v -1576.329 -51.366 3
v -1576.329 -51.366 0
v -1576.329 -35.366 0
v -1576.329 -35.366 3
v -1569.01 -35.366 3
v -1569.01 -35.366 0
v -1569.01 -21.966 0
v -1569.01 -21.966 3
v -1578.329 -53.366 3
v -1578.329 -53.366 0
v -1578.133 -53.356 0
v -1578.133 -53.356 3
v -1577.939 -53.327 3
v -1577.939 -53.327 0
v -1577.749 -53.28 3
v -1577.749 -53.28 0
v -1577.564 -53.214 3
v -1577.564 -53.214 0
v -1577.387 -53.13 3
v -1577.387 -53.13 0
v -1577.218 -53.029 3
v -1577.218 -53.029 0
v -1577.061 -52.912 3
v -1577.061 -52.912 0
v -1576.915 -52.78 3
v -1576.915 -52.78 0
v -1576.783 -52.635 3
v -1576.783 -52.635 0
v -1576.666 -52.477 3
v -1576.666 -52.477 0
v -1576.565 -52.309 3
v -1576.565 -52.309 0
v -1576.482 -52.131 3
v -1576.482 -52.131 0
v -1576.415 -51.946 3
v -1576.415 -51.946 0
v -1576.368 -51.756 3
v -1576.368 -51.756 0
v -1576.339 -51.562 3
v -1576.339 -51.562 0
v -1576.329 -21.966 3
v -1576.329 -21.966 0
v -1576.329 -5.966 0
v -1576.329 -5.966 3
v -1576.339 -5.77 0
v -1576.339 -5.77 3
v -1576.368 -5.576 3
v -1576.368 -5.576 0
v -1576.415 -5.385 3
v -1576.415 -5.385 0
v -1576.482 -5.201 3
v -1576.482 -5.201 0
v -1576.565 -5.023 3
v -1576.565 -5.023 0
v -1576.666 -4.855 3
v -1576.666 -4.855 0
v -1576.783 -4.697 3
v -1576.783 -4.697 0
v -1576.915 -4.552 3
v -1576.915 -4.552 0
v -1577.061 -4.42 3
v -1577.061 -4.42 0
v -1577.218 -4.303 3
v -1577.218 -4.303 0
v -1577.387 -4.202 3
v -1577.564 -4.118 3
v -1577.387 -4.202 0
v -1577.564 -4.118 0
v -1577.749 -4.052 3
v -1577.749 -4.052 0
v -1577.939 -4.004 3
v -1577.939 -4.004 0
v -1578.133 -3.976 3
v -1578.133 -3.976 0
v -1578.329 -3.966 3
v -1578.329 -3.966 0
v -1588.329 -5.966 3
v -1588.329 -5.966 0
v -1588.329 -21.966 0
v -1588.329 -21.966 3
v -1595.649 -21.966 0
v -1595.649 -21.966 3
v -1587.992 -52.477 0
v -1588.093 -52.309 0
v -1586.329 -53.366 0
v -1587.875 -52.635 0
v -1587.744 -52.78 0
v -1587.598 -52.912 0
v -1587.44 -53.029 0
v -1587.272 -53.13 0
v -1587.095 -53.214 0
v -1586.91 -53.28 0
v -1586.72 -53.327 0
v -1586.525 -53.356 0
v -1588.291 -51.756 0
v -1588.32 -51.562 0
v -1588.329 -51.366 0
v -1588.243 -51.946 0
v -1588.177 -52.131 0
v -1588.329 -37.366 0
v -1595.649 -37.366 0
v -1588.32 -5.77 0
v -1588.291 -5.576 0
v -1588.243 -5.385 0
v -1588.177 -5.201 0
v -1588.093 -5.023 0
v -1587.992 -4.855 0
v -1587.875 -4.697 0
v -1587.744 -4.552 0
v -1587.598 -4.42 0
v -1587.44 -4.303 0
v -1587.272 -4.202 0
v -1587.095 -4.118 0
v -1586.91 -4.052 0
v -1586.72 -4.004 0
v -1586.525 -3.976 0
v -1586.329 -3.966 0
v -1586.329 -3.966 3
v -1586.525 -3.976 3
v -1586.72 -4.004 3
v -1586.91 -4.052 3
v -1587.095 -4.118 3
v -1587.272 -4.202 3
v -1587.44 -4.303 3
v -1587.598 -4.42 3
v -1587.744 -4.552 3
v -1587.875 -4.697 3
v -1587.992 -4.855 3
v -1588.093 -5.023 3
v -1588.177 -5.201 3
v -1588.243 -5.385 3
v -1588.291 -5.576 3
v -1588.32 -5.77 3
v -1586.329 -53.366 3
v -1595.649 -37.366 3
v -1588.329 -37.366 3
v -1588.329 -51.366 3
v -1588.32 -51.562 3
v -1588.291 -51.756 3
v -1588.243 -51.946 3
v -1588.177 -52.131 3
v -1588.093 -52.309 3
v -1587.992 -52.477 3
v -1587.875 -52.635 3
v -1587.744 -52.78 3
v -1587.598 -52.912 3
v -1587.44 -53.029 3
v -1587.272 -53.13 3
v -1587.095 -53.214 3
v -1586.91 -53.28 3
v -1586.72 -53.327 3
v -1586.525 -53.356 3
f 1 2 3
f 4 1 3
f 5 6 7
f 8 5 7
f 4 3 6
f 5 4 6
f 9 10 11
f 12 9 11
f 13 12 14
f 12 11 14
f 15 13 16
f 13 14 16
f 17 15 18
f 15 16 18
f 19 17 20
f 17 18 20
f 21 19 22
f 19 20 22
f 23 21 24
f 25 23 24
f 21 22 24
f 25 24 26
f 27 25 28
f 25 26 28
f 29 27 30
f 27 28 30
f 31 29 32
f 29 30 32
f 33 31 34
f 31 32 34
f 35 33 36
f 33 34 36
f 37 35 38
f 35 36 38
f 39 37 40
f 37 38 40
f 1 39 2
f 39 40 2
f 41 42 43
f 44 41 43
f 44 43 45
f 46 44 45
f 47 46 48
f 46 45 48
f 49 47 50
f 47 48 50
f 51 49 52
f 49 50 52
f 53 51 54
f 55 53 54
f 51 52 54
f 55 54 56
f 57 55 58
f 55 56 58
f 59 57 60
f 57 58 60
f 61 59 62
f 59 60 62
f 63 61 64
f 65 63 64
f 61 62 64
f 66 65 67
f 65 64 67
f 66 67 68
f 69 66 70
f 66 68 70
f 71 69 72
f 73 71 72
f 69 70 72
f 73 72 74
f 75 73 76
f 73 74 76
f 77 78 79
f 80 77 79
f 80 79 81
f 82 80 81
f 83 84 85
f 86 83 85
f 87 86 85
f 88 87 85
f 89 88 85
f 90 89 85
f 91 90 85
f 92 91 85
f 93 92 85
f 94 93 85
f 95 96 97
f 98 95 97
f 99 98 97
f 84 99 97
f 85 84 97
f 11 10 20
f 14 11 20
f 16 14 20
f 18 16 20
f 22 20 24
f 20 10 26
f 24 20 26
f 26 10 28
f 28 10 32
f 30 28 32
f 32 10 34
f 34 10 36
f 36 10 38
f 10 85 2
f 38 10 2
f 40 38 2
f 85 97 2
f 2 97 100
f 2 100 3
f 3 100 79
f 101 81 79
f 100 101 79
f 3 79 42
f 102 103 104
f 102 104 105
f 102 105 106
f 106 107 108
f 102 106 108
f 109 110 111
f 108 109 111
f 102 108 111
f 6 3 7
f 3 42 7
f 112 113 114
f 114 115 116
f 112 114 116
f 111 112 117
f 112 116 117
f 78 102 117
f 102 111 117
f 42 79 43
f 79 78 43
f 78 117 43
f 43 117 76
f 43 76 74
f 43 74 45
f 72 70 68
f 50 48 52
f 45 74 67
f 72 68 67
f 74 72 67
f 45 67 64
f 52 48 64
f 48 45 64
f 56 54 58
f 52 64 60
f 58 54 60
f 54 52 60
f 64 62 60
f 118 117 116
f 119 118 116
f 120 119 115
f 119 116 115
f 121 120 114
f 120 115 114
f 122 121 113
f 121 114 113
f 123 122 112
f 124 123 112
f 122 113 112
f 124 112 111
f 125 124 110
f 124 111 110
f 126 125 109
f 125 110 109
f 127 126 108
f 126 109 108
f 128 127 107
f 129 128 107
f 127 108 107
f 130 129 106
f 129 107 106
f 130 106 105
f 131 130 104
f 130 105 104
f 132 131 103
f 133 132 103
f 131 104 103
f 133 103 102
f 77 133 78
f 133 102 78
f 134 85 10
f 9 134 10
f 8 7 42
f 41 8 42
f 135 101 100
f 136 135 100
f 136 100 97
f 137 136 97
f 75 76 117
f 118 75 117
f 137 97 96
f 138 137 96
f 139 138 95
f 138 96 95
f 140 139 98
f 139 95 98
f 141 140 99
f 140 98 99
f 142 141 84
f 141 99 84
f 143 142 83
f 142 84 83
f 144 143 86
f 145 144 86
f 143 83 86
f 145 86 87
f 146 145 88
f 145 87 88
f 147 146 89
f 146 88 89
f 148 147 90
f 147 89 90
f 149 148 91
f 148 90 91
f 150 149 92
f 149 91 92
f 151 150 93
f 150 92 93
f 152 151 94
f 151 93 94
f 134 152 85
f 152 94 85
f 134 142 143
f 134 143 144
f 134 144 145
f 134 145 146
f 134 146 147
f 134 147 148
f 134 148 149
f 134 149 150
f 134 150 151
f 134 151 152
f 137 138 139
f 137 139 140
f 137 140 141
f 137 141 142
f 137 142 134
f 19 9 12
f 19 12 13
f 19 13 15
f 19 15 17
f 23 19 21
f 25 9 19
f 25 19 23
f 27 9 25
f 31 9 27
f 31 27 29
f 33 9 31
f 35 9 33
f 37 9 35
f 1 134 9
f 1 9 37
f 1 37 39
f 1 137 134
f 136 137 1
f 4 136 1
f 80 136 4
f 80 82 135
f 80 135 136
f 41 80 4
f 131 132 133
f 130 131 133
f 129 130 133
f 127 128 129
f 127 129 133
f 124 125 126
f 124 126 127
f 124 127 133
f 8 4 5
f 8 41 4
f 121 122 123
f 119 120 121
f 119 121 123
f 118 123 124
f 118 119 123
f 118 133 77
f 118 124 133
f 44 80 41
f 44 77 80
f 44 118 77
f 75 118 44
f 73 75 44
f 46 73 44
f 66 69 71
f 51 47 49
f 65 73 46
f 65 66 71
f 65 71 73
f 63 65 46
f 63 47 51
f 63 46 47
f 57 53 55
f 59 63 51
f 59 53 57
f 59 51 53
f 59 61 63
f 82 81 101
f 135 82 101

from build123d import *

# Parameters (mm, degrees)
BASE_EXTRUDE_DEPTH = 3


with BuildPart() as part:
    # Sketch1 → Base-Extrude (new body)
    with BuildSketch(Plane.XY):
        with BuildLine():
            Line((-1588.329332145, -37.365903922), (-1588.329332145, -51.365903922))
            ThreePointArc((-1588.329332145, -51.365903922), (-1587.743545707, -52.780117485), (-1586.329332145, -53.365903922))
            Line((-1586.329332145, -53.365903922), (-1578.329332145, -53.365903922))
            ThreePointArc((-1578.329332145, -53.365903922), (-1576.915118583, -52.780117485), (-1576.329332145, -51.365903922))
            Line((-1576.329332145, -51.365903922), (-1576.329332145, -35.365903922))
            Line((-1576.329332145, -35.365903922), (-1569.009666147, -35.365903922))
            Line((-1569.009666147, -35.365903922), (-1569.009666147, -21.965903922))
            Line((-1569.009666147, -21.965903922), (-1576.329332145, -21.965903922))
            Line((-1576.329332145, -21.965903922), (-1576.329332145, -5.965903922))
            ThreePointArc((-1576.329332145, -5.965903922), (-1576.915118583, -4.55169036), (-1578.329332145, -3.965903922))
            Line((-1578.329332145, -3.965903922), (-1586.329332145, -3.965903922))
            ThreePointArc((-1586.329332145, -3.965903922), (-1587.743545707, -4.55169036), (-1588.329332145, -5.965903922))
            Line((-1588.329332145, -5.965903922), (-1588.329332145, -21.965903922))
            Line((-1588.329332145, -21.965903922), (-1595.648998143, -21.965903922))
            Line((-1595.648998143, -21.965903922), (-1595.648998143, -37.365903922))
            Line((-1595.648998143, -37.365903922), (-1588.329332145, -37.365903922))
        make_face()
    extrude(amount=BASE_EXTRUDE_DEPTH)


solid = part.part
